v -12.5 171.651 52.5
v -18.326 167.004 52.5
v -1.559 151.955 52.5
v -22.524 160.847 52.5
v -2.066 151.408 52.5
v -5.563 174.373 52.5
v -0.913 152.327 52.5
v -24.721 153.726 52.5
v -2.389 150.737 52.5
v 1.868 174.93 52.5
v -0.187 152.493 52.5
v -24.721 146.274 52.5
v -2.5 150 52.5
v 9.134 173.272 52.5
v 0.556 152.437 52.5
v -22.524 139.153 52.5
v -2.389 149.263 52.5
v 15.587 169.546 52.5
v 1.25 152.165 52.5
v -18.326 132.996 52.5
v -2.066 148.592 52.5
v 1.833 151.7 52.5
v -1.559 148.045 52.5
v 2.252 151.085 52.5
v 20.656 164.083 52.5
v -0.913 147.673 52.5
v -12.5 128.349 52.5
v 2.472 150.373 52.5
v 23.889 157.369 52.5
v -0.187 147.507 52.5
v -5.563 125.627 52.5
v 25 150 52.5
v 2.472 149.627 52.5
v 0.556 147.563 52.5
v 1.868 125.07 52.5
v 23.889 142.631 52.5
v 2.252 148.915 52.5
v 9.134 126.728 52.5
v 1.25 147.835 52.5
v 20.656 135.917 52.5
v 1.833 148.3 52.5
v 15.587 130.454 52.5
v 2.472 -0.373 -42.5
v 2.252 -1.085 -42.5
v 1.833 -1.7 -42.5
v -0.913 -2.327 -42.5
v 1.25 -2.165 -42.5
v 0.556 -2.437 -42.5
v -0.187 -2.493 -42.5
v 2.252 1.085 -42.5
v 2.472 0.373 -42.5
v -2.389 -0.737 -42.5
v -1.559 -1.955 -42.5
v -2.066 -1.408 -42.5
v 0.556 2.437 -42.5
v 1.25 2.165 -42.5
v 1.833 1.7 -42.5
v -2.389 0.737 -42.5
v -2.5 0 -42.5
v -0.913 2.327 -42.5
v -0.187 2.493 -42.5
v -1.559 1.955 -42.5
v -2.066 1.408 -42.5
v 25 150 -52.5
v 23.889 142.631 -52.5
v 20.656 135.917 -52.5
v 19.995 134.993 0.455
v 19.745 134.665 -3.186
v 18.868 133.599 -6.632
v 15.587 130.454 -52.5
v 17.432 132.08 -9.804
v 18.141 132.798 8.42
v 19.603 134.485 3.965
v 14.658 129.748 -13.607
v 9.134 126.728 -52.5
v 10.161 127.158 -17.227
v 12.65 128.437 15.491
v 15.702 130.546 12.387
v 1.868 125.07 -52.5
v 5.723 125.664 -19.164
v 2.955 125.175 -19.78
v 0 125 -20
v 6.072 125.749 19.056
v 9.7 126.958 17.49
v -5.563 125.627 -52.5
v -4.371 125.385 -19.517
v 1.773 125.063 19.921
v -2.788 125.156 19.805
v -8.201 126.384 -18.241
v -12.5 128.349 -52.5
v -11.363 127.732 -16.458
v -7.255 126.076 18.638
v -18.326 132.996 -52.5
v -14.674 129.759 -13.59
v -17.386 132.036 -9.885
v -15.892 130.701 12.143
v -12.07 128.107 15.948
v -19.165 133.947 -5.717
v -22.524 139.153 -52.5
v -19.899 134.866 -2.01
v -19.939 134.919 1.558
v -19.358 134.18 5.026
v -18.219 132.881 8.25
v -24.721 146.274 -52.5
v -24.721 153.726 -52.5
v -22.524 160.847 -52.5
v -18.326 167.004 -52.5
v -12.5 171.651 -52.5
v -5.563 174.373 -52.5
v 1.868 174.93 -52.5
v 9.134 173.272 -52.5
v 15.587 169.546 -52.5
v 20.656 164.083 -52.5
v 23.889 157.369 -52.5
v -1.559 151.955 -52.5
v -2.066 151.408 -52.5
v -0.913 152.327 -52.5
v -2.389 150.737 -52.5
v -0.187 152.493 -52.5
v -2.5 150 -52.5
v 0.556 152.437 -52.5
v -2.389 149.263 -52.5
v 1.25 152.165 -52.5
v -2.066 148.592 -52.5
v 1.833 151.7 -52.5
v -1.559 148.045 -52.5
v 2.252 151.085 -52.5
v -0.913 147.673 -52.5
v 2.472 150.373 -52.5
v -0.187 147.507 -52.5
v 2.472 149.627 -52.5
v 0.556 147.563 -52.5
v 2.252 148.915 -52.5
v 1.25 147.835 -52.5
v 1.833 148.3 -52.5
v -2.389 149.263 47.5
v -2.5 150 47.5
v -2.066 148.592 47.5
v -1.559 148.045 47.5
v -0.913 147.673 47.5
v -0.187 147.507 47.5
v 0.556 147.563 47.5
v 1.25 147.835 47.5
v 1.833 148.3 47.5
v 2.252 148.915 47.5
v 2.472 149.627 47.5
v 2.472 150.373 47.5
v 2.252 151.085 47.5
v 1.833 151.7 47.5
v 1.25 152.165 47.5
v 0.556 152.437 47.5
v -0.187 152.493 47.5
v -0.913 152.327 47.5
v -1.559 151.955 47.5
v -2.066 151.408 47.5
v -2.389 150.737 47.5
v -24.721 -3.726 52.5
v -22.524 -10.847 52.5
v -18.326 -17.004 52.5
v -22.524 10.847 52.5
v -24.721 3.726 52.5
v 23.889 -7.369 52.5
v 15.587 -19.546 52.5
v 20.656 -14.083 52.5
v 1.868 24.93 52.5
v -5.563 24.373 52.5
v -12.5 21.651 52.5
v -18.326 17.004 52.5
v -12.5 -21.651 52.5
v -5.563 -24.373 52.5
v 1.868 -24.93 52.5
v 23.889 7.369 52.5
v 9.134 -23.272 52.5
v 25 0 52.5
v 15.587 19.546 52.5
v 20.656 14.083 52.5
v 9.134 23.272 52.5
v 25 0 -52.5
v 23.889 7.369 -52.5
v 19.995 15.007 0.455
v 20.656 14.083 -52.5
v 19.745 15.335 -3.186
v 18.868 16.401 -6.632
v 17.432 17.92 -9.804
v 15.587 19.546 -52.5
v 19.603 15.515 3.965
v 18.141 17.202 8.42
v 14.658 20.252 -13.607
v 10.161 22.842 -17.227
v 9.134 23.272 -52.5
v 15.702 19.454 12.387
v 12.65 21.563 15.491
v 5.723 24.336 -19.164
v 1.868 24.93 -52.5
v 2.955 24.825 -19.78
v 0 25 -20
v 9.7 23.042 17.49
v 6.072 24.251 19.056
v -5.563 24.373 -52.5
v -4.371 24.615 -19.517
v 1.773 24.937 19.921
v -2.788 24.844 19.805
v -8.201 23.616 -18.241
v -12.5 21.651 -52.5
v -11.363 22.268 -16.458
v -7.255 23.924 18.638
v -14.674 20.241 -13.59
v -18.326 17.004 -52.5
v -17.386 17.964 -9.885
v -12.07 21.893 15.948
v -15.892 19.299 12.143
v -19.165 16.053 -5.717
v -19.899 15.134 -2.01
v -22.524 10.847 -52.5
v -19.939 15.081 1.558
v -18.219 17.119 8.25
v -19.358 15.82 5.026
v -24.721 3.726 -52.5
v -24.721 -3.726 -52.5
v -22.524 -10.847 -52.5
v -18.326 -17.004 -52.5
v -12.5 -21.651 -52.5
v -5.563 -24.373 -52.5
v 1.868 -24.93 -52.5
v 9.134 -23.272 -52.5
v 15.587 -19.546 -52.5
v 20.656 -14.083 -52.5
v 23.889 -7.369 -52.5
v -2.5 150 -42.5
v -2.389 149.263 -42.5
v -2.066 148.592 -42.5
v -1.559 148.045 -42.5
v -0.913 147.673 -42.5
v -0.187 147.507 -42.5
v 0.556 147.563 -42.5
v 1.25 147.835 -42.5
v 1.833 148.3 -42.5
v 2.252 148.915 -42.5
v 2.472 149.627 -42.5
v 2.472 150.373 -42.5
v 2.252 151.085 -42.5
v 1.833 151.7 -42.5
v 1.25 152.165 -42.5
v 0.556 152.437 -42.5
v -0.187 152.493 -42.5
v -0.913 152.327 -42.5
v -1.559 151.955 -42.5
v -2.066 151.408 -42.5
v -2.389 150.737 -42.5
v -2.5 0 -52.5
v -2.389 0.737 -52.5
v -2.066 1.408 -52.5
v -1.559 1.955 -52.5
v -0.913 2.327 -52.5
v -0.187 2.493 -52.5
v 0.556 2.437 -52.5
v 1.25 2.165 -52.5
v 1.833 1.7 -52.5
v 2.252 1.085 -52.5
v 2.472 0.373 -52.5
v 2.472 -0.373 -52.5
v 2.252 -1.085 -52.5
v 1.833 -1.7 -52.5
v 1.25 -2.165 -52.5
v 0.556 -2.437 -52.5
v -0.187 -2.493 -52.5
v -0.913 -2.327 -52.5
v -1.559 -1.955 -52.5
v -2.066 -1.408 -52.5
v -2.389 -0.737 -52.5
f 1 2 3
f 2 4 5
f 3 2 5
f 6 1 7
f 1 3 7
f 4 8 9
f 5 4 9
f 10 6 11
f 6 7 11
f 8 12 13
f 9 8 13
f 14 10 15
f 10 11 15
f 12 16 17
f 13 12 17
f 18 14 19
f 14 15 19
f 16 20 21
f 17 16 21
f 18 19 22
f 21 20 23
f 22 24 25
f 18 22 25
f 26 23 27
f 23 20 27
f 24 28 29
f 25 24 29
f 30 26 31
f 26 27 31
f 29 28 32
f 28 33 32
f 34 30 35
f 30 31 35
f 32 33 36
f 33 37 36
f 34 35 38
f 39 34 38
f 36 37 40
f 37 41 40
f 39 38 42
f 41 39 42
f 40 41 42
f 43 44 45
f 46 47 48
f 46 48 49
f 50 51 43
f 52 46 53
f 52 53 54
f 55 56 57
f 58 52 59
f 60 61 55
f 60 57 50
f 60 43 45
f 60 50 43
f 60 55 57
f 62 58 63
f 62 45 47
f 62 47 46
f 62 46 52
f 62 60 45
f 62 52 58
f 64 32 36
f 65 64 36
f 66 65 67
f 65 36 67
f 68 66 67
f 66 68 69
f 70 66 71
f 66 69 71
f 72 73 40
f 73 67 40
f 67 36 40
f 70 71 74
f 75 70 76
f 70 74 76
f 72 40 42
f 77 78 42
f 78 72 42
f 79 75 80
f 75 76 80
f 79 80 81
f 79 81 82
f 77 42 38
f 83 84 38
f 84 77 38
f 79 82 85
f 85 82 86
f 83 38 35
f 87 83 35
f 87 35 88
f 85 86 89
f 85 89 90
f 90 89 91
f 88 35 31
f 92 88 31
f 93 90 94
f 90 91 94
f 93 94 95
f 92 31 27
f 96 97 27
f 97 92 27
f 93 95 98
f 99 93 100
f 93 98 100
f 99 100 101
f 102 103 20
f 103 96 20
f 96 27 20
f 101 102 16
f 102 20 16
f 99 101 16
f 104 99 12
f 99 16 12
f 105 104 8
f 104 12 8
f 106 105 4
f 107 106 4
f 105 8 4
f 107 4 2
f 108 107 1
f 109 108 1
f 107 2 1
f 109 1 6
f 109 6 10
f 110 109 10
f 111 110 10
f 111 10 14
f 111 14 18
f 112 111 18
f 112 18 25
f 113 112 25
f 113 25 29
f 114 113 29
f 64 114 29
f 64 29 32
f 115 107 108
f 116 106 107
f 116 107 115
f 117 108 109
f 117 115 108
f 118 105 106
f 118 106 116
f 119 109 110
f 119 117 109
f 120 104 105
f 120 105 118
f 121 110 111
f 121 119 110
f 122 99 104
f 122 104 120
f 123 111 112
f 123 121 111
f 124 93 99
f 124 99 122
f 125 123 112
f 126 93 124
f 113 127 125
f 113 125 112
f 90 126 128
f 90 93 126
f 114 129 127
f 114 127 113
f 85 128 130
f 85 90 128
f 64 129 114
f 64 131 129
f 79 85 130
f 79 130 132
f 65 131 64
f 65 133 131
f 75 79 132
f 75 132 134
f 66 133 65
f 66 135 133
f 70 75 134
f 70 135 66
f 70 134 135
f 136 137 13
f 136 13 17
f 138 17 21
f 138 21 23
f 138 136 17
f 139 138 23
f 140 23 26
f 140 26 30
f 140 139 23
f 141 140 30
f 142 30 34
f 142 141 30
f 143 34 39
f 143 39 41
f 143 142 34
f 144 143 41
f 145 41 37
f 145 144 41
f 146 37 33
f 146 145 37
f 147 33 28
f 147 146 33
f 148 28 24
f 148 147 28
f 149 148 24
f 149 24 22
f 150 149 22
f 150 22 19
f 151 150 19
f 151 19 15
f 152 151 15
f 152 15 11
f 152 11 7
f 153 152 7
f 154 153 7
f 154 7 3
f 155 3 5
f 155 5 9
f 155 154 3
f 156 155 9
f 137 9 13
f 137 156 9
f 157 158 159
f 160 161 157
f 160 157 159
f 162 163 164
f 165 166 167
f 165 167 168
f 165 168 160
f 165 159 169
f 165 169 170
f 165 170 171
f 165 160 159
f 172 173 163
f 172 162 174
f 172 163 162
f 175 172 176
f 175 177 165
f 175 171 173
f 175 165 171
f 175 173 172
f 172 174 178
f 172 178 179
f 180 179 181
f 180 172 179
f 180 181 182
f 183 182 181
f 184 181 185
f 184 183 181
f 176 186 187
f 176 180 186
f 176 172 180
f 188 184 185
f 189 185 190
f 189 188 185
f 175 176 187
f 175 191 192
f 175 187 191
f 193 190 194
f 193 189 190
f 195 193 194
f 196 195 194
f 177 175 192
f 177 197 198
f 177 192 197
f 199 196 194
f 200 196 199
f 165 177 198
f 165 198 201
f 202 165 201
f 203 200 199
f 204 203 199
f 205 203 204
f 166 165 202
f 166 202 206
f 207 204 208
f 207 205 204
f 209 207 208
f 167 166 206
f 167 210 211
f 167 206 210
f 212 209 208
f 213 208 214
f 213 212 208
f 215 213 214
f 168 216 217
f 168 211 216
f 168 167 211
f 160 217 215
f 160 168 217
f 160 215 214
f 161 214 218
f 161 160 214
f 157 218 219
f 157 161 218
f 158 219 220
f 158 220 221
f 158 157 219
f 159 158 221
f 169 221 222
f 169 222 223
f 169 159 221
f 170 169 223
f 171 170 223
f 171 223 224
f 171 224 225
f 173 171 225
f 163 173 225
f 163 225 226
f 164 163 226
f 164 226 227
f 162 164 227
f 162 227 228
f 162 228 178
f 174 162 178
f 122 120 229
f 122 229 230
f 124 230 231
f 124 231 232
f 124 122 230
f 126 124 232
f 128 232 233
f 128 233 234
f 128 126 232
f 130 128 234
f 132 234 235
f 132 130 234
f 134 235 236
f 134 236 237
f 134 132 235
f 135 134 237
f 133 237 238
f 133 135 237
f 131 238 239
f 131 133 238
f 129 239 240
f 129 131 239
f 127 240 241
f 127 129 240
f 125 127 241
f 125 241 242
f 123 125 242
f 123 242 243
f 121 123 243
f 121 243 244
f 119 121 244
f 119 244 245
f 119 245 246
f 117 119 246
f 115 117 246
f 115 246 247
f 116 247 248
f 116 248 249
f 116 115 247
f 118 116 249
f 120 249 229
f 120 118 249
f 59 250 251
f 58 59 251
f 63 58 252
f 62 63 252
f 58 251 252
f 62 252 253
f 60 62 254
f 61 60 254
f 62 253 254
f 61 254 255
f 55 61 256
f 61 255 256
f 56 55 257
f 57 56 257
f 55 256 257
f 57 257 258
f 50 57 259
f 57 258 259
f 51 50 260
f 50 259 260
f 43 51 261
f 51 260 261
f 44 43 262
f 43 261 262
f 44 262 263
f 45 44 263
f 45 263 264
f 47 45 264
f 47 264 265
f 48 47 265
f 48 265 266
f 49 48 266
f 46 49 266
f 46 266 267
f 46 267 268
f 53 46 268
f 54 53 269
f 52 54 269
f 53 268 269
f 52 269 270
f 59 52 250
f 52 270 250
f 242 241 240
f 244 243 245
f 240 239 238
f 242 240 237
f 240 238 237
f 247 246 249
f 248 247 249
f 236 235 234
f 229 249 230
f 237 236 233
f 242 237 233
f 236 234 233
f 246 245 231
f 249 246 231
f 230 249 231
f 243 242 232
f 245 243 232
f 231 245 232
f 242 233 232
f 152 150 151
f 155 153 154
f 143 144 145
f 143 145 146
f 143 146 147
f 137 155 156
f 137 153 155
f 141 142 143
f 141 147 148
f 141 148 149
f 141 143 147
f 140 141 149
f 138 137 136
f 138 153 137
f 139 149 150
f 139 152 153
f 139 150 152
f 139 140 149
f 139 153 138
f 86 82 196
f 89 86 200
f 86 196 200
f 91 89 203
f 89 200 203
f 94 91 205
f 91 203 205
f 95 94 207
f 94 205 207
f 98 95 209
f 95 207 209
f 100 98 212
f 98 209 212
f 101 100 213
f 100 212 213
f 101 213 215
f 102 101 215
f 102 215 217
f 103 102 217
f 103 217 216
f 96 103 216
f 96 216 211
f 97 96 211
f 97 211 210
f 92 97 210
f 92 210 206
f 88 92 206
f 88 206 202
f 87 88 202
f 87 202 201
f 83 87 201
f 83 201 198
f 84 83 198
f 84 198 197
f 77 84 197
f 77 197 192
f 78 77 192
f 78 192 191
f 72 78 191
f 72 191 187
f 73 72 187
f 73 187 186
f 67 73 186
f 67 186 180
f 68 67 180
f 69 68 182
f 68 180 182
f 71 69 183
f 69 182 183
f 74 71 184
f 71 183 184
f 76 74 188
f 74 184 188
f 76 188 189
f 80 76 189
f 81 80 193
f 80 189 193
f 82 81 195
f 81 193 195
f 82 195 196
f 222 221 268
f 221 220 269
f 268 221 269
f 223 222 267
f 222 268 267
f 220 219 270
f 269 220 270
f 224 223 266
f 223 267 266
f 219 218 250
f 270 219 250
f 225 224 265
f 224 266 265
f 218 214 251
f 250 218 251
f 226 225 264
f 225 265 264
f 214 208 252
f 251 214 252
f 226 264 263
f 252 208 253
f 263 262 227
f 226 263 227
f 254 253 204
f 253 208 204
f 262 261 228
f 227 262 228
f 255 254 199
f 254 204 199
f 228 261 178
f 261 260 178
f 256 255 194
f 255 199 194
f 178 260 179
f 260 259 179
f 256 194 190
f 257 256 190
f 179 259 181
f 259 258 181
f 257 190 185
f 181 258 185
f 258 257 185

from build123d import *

# Parameters (mm, degrees)
SKETCH1_R           = 25
BOSS_EXTRUDE1_DEPTH = 52.5
SKETCH2_R           = 2.5
CUT_EXTRUDE1_DEPTH  = 10
SKETCH3_R           = 20
BOSS_EXTRUDE2_DEPTH = 150
CUT_EXTRUDE2_START  = -5
SKETCH4_R           = 2.5
CUT_EXTRUDE2_DEPTH  = 5


with BuildPart() as part:
    # Sketch1 → Boss-Extrude1 (new, symmetric)
    with BuildSketch(Plane.XY):
        Circle(SKETCH1_R)
    boss_extrude1 = extrude(amount=BOSS_EXTRUDE1_DEPTH, both=True)

    # Sketch2 → Cut-Extrude1 (cut)
    with BuildSketch(Plane(origin=(0, 0, -52.5), x_dir=(-1, 0, 0), z_dir=(0, 0, -1))):
        Circle(SKETCH2_R)
    cut_extrude1 = extrude(amount=-CUT_EXTRUDE1_DEPTH, mode=Mode.SUBTRACT)

    # Sketch3 → Boss-Extrude2 (add)
    with BuildSketch(Plane(origin=(0, 0, 0), x_dir=(1, 0, 0), z_dir=(0, 1, 0))):
        with Locations(Location((0, 0, 0), (0, 0, 90))):
            Circle(SKETCH3_R)
    extrude(amount=BOSS_EXTRUDE2_DEPTH)

    # Mirror1: Boss-Extrude1, Cut-Extrude1 across plane
    add(boss_extrude1.mirror(Plane.ZX.offset(75)))
    add(cut_extrude1.mirror(Plane.ZX.offset(75)), mode=Mode.SUBTRACT)

    # Sketch4 → Cut-Extrude2 (cut)
    with BuildSketch(Plane.XY.offset(52.5).offset(CUT_EXTRUDE2_START)):
        with Locations(Location((0, 150, 0), (0, 0, 180))):
            Circle(SKETCH4_R)
    extrude(amount=CUT_EXTRUDE2_DEPTH, mode=Mode.SUBTRACT)


solid = part.part
